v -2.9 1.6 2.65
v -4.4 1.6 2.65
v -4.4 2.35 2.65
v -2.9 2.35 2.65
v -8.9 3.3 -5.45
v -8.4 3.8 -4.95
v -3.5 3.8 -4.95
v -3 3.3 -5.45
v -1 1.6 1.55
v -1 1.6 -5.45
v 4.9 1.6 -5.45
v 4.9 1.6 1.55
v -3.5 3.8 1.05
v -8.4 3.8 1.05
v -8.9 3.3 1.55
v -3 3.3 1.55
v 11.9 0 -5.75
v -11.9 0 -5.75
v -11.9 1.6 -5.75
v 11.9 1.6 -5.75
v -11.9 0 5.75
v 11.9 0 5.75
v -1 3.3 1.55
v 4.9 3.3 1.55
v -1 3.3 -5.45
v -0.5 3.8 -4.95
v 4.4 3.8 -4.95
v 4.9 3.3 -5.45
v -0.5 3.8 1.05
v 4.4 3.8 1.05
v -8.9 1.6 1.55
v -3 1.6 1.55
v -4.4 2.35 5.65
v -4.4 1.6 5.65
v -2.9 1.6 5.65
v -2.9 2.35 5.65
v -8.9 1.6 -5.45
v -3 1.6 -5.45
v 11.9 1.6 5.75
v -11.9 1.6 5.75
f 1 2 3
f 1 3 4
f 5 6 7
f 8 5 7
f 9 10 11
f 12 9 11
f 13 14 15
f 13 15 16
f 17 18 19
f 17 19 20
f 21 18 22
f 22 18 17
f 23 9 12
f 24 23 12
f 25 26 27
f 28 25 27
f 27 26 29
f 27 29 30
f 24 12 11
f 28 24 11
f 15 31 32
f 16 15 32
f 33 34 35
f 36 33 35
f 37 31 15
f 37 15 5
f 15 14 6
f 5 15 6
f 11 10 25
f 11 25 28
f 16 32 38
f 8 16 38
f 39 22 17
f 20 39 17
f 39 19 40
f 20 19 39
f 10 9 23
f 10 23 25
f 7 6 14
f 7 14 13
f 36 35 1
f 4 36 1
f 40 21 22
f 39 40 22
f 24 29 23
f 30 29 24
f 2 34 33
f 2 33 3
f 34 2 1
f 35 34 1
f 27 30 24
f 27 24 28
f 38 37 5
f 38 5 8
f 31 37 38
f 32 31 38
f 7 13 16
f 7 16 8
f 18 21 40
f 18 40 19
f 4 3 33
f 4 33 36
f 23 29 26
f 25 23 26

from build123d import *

# Parameters (mm, degrees)
CROQUIS1_W                = 23.8
CROQUIS1_H                = 11.5
SALIENTE_EXTRUIR1_DEPTH   = 1.6
CROQUIS2_W                = 5.9
CROQUIS2_H                = 7
SALIENTE_EXTRUIR2_DEPTH   = 2.2
SALIENTE_EXTRUIR2_2_DEPTH = 2.2
CROQUIS3_W                = 1.5
CROQUIS3_H                = 3
SALIENTE_EXTRUIR3_DEPTH   = 0.75
CHAFL_N1_SIZE             = 0.5
CHAFL_N2_SIZE             = 0.5


with BuildPart() as part:
    # Croquis1 → Saliente-Extruir1 (new body)
    with BuildSketch(Plane(origin=(0, 0, 0), x_dir=(1, 0, 0), z_dir=(0, 1, 0))):
        Rectangle(CROQUIS1_W, CROQUIS1_H)
    extrude(amount=SALIENTE_EXTRUIR1_DEPTH)


with BuildPart() as body_2:
    # Croquis2 → Saliente-Extruir2 (new body)
    with BuildSketch(Plane(origin=(0, 1.6, 0), x_dir=(1, 0, 0), z_dir=(0, 1, 0))):
        with Locations((1.95, 1.95)):
            Rectangle(CROQUIS2_W, CROQUIS2_H)
    extrude(amount=SALIENTE_EXTRUIR2_DEPTH)

    # Chaflán2
    chafl_n2_edges = [body_2.edges().sort_by_distance(p)[0] for p in [
        (4.9, 3.8, -1.95),
        (1.95, 3.8, -5.45),
        (-1, 3.8, -1.95),
        (1.95, 3.8, 1.55),
    ]]
    chamfer(chafl_n2_edges, length=CHAFL_N2_SIZE)


with BuildPart() as body_3:
    # Croquis2 → Saliente-Extruir2 2 (new body)
    with BuildSketch(Plane(origin=(0, 1.6, 0), x_dir=(1, 0, 0), z_dir=(0, 1, 0))):
        with Locations((-5.95, 1.95)):
            Rectangle(CROQUIS2_W, CROQUIS2_H)
    extrude(amount=SALIENTE_EXTRUIR2_2_DEPTH)

    # Chaflán1
    chafl_n1_edges = [body_3.edges().sort_by_distance(p)[0] for p in [
        (-3, 3.8, -1.95),
        (-5.95, 3.8, -5.45),
        (-8.9, 3.8, -1.95),
        (-5.95, 3.8, 1.55),
    ]]
    chamfer(chafl_n1_edges, length=CHAFL_N1_SIZE)


with BuildPart() as body_4:
    # Croquis3 → Saliente-Extruir3 (new body)
    with BuildSketch(Plane(origin=(0, 1.6, 0), x_dir=(1, 0, 0), z_dir=(0, 1, 0))):
        with Locations((-3.65, -4.15)):
            Rectangle(CROQUIS3_W, CROQUIS3_H)
    extrude(amount=SALIENTE_EXTRUIR3_DEPTH)


solid = Compound([part.part, body_2.part, body_3.part, body_4.part])
